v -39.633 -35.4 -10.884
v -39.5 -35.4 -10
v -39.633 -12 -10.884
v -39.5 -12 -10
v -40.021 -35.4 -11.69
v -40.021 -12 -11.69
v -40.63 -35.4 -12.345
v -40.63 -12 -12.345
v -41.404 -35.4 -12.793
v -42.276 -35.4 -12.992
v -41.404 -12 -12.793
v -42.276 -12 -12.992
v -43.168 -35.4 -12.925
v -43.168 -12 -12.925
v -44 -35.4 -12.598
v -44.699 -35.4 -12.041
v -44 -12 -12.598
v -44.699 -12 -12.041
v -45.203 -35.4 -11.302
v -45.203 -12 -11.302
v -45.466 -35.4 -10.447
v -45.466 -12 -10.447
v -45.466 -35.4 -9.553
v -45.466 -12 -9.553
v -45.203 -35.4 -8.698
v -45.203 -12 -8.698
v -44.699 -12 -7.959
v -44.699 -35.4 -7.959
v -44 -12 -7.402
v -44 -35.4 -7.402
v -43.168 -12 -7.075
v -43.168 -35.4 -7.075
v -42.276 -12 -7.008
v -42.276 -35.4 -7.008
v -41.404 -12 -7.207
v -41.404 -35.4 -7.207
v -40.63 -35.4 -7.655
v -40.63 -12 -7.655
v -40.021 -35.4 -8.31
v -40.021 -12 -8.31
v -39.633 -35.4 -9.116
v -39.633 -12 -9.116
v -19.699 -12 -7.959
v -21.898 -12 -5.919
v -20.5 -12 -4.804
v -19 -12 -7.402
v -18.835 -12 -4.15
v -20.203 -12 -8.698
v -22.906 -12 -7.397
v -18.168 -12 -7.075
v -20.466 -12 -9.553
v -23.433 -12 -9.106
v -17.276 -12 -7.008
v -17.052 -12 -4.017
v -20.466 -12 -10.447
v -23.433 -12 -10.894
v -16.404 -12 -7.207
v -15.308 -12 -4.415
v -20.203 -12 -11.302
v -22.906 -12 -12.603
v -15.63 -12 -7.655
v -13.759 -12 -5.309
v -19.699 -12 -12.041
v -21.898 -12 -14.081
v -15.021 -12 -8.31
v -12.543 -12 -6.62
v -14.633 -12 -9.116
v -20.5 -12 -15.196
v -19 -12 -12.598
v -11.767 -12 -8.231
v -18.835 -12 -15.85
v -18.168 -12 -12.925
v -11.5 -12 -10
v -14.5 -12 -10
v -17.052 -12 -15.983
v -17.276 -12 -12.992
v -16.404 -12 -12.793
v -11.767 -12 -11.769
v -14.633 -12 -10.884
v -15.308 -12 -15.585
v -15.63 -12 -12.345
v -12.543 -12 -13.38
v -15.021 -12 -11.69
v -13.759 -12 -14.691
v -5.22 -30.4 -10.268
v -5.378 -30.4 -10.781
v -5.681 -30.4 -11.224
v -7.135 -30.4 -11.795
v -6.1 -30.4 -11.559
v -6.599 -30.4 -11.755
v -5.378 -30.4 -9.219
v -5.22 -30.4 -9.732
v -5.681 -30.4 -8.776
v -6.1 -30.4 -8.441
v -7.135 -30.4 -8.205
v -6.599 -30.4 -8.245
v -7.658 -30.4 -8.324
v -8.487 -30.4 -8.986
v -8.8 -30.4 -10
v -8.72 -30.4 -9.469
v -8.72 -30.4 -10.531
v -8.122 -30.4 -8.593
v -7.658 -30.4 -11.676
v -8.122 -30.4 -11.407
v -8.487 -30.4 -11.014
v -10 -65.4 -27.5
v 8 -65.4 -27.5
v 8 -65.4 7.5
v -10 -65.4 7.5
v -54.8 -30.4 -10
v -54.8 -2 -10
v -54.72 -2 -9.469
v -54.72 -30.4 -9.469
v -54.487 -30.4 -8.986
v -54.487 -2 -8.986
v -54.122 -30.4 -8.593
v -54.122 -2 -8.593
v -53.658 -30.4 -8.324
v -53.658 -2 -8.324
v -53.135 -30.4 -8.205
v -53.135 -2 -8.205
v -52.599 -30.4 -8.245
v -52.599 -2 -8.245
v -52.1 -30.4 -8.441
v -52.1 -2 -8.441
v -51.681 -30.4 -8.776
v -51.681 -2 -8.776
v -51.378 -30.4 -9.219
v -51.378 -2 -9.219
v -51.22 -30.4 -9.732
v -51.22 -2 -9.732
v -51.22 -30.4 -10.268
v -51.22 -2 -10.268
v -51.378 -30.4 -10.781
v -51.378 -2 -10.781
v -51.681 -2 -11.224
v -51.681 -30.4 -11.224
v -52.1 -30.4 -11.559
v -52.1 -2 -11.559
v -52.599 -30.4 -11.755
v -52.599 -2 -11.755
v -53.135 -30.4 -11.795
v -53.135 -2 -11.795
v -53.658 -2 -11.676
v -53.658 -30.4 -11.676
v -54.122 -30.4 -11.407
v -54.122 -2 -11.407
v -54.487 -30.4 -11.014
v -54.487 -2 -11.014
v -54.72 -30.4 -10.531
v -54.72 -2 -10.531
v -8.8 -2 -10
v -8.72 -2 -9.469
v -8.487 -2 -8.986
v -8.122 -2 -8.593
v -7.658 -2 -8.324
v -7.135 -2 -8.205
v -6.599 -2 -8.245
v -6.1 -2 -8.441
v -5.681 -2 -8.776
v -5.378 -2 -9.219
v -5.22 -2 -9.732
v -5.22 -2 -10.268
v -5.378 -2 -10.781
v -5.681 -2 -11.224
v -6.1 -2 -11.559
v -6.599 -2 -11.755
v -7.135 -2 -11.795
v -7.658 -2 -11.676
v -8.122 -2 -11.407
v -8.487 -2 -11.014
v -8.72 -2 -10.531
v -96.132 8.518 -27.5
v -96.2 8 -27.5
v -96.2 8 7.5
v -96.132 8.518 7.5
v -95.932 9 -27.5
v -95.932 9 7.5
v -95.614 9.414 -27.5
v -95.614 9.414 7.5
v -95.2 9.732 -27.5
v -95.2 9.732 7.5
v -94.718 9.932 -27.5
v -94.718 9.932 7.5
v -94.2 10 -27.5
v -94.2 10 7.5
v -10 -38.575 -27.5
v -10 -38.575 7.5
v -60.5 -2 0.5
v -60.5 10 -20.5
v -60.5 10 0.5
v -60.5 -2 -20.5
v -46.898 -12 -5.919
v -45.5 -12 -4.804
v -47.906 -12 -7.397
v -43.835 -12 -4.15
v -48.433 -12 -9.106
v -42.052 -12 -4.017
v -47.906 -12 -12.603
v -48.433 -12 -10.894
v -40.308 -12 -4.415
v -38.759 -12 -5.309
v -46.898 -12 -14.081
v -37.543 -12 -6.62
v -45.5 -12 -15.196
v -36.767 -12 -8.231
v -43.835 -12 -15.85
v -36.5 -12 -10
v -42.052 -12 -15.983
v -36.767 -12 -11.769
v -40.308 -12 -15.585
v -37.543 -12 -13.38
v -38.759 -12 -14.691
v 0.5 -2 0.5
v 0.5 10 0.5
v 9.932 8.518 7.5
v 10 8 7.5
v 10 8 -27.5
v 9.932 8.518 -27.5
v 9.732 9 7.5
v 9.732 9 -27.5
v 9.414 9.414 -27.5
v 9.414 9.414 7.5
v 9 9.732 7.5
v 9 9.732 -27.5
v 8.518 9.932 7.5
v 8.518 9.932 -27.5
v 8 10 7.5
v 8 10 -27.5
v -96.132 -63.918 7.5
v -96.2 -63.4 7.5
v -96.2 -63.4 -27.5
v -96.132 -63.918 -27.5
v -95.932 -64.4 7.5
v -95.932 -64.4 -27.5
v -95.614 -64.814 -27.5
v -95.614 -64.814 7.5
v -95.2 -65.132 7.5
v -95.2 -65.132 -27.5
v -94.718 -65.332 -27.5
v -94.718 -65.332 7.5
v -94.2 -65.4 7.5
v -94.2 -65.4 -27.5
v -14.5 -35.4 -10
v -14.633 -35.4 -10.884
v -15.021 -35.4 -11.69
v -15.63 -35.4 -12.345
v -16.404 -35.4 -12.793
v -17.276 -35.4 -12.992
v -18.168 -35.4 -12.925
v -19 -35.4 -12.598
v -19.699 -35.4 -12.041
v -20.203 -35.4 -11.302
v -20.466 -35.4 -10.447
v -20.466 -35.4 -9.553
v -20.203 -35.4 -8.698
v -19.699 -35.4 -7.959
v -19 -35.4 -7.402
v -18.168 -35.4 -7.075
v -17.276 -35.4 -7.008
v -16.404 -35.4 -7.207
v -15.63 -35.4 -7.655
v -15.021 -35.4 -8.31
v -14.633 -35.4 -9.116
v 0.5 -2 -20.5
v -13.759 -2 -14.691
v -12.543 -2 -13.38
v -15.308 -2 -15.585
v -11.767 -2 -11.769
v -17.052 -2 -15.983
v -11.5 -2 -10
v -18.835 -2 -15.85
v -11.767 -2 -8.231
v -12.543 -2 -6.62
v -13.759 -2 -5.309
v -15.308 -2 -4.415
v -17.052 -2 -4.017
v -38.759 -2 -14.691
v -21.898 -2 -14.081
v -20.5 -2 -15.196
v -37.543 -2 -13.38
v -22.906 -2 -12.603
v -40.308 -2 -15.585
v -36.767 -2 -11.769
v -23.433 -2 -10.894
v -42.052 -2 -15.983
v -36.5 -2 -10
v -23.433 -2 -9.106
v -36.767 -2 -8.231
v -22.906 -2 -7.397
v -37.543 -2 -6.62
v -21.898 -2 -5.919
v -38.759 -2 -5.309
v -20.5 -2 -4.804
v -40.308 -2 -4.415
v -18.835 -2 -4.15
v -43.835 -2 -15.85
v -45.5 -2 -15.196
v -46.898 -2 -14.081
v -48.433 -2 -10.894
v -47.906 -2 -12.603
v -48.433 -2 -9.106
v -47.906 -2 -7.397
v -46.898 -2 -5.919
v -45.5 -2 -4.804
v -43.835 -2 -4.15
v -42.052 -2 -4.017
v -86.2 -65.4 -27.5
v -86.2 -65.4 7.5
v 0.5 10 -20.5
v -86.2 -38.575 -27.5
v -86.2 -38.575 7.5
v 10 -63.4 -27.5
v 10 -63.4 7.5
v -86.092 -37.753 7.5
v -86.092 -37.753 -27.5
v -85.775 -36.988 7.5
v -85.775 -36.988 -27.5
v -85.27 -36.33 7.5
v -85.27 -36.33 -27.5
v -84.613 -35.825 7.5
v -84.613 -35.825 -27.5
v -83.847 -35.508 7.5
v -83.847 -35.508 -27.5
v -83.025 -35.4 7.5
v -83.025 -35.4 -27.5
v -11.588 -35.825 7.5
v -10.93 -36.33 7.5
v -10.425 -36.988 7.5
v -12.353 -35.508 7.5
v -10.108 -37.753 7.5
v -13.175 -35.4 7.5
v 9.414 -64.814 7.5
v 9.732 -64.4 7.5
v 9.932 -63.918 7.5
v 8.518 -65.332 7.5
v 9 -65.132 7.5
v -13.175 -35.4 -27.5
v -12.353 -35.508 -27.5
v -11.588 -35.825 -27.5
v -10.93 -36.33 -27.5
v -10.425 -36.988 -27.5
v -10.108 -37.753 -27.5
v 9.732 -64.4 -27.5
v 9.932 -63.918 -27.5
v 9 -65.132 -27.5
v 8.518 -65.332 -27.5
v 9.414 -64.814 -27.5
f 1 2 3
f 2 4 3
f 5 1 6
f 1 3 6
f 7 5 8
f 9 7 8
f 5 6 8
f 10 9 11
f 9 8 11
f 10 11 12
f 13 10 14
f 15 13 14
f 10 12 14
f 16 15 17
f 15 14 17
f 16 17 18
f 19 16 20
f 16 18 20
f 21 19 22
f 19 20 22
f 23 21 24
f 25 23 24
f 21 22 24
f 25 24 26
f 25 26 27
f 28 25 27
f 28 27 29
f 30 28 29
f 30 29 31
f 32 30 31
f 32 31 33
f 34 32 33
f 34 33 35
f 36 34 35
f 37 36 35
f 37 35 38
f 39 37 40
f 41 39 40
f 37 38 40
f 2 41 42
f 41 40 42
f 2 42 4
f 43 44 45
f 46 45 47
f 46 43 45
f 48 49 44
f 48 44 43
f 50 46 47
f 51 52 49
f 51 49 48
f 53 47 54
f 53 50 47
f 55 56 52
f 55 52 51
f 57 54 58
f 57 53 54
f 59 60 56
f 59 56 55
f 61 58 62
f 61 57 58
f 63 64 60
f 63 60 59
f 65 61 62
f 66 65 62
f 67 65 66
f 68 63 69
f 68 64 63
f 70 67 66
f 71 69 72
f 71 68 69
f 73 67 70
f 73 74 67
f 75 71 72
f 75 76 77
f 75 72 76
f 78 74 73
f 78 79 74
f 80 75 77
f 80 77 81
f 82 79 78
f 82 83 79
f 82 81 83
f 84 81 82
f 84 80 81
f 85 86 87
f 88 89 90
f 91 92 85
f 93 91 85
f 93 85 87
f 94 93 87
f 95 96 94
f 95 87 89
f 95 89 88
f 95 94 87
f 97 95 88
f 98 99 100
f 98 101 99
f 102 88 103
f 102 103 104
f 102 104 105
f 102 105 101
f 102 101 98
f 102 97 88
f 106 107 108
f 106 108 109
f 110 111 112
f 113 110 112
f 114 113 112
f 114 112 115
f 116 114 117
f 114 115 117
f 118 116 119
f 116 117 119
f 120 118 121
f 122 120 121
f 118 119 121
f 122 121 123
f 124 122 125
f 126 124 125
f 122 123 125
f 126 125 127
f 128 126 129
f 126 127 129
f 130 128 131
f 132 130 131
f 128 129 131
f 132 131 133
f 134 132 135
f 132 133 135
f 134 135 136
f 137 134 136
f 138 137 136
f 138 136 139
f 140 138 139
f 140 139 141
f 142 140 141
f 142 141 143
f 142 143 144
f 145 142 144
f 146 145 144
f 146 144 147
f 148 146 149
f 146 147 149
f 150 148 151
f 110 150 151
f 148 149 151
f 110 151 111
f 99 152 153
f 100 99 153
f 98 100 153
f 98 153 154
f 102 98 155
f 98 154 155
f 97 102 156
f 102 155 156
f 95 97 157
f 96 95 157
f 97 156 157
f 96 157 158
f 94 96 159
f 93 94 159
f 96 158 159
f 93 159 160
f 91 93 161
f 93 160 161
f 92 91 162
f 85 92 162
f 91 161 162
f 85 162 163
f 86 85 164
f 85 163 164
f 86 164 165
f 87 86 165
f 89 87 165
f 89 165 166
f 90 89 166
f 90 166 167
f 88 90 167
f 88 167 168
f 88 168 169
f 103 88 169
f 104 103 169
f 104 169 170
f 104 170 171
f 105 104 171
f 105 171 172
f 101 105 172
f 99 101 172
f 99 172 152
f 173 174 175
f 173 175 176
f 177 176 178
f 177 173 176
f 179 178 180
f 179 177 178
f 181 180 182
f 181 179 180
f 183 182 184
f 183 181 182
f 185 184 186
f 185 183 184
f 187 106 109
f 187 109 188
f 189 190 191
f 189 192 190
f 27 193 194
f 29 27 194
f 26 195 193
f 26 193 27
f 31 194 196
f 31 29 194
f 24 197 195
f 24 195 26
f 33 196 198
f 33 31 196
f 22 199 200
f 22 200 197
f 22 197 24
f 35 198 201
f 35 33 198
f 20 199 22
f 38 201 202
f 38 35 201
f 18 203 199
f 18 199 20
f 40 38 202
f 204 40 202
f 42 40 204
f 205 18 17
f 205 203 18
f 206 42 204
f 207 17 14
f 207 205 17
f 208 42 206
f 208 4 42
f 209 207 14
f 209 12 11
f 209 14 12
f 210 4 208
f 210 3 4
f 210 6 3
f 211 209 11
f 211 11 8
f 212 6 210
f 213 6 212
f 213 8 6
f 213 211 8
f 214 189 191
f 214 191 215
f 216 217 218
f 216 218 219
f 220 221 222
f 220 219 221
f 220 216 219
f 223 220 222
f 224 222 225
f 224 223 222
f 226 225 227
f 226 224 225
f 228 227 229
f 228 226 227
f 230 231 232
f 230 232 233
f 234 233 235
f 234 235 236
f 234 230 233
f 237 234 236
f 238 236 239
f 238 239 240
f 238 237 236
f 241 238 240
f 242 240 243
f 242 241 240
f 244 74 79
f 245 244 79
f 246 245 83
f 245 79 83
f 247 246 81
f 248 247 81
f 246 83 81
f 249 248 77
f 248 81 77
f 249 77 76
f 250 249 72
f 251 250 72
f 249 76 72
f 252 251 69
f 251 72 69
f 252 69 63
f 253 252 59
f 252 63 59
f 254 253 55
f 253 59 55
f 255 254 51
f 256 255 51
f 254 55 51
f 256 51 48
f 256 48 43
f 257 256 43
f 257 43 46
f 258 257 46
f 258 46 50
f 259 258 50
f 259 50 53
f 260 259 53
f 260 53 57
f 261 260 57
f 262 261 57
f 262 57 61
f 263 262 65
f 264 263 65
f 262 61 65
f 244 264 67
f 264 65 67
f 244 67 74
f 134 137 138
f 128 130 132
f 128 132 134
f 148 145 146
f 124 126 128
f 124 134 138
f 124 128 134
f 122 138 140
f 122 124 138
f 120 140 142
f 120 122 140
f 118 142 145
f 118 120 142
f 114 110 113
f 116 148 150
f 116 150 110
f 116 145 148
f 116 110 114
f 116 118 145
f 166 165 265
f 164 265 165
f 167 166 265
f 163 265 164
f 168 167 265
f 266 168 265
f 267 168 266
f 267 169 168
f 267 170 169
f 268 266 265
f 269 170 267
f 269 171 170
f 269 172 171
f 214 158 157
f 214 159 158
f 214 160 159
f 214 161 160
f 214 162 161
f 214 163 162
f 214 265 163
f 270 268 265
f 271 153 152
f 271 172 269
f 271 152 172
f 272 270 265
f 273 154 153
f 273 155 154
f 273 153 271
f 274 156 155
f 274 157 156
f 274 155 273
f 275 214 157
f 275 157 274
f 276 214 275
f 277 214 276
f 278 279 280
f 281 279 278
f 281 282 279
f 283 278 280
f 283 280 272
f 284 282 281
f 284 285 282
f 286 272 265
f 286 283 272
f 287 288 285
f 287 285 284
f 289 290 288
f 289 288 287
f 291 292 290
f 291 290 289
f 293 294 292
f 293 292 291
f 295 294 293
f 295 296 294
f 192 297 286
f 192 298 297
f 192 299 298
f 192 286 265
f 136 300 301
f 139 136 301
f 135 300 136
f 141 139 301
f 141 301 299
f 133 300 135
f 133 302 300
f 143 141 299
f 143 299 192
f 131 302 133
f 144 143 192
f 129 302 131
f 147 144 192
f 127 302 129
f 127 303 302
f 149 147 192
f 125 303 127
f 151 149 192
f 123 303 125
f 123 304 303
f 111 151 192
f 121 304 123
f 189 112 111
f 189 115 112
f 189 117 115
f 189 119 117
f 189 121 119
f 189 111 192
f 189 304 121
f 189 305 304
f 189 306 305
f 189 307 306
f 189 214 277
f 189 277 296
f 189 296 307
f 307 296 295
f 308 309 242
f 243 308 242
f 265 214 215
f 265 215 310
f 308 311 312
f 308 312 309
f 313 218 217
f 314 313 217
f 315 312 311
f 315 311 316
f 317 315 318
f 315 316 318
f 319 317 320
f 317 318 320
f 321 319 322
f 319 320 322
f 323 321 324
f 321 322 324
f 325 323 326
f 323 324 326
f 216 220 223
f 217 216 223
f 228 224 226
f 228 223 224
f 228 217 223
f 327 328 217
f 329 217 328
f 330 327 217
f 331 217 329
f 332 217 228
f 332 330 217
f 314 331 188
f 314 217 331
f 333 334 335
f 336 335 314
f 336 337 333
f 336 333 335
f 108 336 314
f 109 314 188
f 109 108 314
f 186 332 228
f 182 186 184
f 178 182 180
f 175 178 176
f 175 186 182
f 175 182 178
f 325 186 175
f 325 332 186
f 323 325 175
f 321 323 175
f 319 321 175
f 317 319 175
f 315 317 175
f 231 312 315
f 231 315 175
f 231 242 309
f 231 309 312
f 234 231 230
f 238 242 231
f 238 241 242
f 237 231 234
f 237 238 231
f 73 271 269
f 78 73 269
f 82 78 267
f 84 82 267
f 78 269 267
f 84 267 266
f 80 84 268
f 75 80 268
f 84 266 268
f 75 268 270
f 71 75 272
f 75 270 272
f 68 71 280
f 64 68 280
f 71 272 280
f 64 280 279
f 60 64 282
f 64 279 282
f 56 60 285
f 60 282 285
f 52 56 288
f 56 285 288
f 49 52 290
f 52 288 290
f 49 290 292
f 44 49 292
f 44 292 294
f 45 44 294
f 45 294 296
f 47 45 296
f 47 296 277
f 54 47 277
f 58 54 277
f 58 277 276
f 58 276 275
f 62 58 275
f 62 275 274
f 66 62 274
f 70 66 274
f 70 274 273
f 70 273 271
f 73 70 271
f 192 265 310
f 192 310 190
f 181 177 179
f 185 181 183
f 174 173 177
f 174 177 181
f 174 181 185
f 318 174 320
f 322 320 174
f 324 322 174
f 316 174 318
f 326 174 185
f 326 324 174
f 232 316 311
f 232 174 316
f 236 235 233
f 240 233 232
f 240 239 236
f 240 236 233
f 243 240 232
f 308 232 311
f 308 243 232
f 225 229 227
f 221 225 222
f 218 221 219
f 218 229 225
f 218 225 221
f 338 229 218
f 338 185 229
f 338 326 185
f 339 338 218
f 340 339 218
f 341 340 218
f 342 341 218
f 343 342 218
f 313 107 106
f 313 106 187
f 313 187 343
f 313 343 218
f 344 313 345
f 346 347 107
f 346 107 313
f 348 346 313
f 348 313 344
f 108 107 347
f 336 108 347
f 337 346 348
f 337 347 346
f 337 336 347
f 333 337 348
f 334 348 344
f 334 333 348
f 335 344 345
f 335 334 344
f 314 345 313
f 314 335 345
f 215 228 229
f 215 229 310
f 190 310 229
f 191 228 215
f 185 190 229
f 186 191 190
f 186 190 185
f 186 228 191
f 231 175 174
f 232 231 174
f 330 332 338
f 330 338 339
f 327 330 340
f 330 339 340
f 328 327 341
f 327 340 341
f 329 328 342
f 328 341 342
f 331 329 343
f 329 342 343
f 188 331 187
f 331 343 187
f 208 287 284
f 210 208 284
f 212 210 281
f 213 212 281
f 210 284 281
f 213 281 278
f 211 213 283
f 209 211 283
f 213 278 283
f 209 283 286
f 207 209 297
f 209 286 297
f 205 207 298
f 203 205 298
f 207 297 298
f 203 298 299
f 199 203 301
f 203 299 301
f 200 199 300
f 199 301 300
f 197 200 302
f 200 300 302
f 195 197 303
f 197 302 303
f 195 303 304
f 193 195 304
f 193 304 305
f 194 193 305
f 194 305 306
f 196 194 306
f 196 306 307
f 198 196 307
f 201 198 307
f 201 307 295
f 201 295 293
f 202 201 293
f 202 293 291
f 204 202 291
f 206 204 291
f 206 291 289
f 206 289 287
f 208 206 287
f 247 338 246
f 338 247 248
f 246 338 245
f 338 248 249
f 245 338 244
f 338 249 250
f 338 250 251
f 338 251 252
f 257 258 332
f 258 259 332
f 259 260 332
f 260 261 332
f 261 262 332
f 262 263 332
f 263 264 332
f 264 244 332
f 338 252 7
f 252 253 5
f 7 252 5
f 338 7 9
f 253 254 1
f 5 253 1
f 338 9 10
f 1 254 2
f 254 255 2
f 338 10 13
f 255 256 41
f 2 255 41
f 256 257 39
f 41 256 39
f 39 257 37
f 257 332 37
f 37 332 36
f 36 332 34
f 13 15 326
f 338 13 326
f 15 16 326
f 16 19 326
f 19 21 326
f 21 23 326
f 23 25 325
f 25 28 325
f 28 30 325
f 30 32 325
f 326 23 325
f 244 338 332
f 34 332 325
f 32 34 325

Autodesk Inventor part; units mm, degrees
ref_plane "YZ Plane" through (0, 0, 0) normal (1, 0, 0) x (0, 1, 0)
ref_plane "XZ Plane" through (0, 0, 0) normal (0, 1, 0) x (-1, 0, 0)
ref_plane "XY Plane" through (0, 0, 0) normal (0, 0, 1) x (1, 0, 0)
sketch "Sketch1" plane through (0, 0, 0) normal (0, 1, 0) x (-1, 0, 0)
  line L0 (0, 0) -> (60, 0) construction
  line L1 (60, 0) -> (60, -20) construction
  line L2 (60, -20) -> (0, -20) construction
  line L3 (0, -20) -> (0, 0) construction
  line L4 (60.5, 0.5) -> (-0.5, 0.5)
  line L5 (-0.5, 0.5) -> (-0.5, -20.5)
  line L6 (-0.5, -20.5) -> (60.5, -20.5)
  line L7 (60.5, -20.5) -> (60.5, 0.5)
  circle A0 centre (53, -10) radius 1.8
  circle A1 centre (7, -10) radius 1.8
  line L8 (53, -10) -> (7, -10) construction
  point P0 (30, -10)
  point P1 (30, -20)
  point P2 (7, -10)
  point P3 (0, -10)
  dimension "d0" = 20
  dimension "d1" = 60
  dimension "d2" = 0.5
  dimension "d3" = 0.5
  dimension "d4" = 0.5
  dimension "d5" = 0.5
  dimension "d6" = 3.6
  dimension "d7" = 46
sketch "Sketch2" plane through (0, 0, 0) normal (0, 1, 0) x (-1, 0, 0)
  line L0 (-10, 7.5) -> (96.2, 7.5)
  line L1 (96.2, 7.5) -> (96.2, -27.5)
  line L2 (96.2, -27.5) -> (-10, -27.5)
  line L3 (-10, -27.5) -> (-10, 7.5)
  line L4 (60.5, -20.5) -> (60.5, 0.5) construction
  line L5 (-0.5, 0.5) -> (-0.5, -20.5) construction
  line L6 (-0.5, -20.5) -> (60.5, -20.5) construction
  point P0 (0, 0)
  point P1 (60.5, -10)
  point P2 (96.2, -10)
  point P3 (30, -20.5)
  point P4 (43.1, -27.5)
  dimension "d9" = 106.2
  dimension "d10" = 35
  dimension "d43" = 10
extrude "Extrusion1" add sketch "Sketch2" along normal blind 10 and the other way blind 35.4
extrude "Extrusion2" cut sketch "Sketch1" along normal blind 10 and the other way blind 2
extrude "Extrusion3" cut sketch "Sketch1" along normal blind 10 and the other way blind 30.4 contours A0 | A1
sketch "Sketch3" plane through (10, 10, -27.5) normal (0, 0, -1) x (-1, 0, 0)
  line L0 (106.2, -45.4) -> (0, -45.4) projected
  line L1 (0, -45.4) -> (0, -75.4)
  line L2 (0, -75.4) -> (20, -75.4)
  line L3 (20, -75.4) -> (20, -48.575)
  line L4 (23.175, -45.4) -> (93.025, -45.4)
  line L5 (96.2, -48.575) -> (96.2, -75.4)
  line L6 (96.2, -75.4) -> (106.2, -75.4)
  line L7 (106.2, -75.4) -> (106.2, -45.4)
  arc A0 (23.175, -45.4) -> (20, -48.575) centre (23.175, -48.575) ccw
  arc A1 (96.2, -48.575) -> (93.025, -45.4) centre (93.025, -48.575) ccw
  point P0 (10, -10)
  point P1 (20, -45.4)
  point P2 (96.2, -45.4)
  point P3 (53.1, -45.4)
  point P4 (93.025, -45.4)
  dimension "d23" = 76.2
  dimension "d24" = 3.175
  dimension "d25" = 20
  dimension "d26" = 30
extrude "Extrusion4" add sketch "Sketch3" against normal up to surface (35 mm away)
sketch "Sketch4" plane through (0, -2, 0) normal (0, 1, 0) x (1, 0, 0)
  circle A0 centre (-42.5, 10) radius 3
  circle A1 centre (-17.5, 10) radius 3
  line L0 (-60.5, 20.5) -> (0.5, 20.5) construction
  line L1 (-60.5, -0.5) -> (-60.5, 20.5) construction
  line L2 (-42.5, 10) -> (-17.5, 10) construction
  point P0 (0, 0)
  point P1 (-30, 20.5)
  point P2 (-30, 10)
  point P3 (-60.5, 10)
  dimension "d29" = 6
  dimension "d30" = 25
extrude "Extrusion5" cut sketch "Sketch4" against normal up to surface (33.4 mm away)
sketch "Sketch5" plane through (0, -2, 0) normal (0, 1, 0) x (1, 0, 0)
  circle A0 centre (-42.5, 10) radius 3 construction
  circle A1 centre (-17.5, 10) radius 3 construction
  circle A2 centre (-17.5, 10) radius 6
  circle A3 centre (-42.5, 10) radius 6
  point P0 (0, 0)
  dimension "d34" = 12
extrude "Extrusion6" cut sketch "Sketch5" against normal blind 10
fillet "Fillet1" radius 2 2 edges at (-96.2, 10, -10) (10, 10, -10)
fillet "Fillet2" radius 2 2 edges at (-96.2, -65.4, -10) (10, -65.4, -10)
properties part number "BK12_Spacer"
